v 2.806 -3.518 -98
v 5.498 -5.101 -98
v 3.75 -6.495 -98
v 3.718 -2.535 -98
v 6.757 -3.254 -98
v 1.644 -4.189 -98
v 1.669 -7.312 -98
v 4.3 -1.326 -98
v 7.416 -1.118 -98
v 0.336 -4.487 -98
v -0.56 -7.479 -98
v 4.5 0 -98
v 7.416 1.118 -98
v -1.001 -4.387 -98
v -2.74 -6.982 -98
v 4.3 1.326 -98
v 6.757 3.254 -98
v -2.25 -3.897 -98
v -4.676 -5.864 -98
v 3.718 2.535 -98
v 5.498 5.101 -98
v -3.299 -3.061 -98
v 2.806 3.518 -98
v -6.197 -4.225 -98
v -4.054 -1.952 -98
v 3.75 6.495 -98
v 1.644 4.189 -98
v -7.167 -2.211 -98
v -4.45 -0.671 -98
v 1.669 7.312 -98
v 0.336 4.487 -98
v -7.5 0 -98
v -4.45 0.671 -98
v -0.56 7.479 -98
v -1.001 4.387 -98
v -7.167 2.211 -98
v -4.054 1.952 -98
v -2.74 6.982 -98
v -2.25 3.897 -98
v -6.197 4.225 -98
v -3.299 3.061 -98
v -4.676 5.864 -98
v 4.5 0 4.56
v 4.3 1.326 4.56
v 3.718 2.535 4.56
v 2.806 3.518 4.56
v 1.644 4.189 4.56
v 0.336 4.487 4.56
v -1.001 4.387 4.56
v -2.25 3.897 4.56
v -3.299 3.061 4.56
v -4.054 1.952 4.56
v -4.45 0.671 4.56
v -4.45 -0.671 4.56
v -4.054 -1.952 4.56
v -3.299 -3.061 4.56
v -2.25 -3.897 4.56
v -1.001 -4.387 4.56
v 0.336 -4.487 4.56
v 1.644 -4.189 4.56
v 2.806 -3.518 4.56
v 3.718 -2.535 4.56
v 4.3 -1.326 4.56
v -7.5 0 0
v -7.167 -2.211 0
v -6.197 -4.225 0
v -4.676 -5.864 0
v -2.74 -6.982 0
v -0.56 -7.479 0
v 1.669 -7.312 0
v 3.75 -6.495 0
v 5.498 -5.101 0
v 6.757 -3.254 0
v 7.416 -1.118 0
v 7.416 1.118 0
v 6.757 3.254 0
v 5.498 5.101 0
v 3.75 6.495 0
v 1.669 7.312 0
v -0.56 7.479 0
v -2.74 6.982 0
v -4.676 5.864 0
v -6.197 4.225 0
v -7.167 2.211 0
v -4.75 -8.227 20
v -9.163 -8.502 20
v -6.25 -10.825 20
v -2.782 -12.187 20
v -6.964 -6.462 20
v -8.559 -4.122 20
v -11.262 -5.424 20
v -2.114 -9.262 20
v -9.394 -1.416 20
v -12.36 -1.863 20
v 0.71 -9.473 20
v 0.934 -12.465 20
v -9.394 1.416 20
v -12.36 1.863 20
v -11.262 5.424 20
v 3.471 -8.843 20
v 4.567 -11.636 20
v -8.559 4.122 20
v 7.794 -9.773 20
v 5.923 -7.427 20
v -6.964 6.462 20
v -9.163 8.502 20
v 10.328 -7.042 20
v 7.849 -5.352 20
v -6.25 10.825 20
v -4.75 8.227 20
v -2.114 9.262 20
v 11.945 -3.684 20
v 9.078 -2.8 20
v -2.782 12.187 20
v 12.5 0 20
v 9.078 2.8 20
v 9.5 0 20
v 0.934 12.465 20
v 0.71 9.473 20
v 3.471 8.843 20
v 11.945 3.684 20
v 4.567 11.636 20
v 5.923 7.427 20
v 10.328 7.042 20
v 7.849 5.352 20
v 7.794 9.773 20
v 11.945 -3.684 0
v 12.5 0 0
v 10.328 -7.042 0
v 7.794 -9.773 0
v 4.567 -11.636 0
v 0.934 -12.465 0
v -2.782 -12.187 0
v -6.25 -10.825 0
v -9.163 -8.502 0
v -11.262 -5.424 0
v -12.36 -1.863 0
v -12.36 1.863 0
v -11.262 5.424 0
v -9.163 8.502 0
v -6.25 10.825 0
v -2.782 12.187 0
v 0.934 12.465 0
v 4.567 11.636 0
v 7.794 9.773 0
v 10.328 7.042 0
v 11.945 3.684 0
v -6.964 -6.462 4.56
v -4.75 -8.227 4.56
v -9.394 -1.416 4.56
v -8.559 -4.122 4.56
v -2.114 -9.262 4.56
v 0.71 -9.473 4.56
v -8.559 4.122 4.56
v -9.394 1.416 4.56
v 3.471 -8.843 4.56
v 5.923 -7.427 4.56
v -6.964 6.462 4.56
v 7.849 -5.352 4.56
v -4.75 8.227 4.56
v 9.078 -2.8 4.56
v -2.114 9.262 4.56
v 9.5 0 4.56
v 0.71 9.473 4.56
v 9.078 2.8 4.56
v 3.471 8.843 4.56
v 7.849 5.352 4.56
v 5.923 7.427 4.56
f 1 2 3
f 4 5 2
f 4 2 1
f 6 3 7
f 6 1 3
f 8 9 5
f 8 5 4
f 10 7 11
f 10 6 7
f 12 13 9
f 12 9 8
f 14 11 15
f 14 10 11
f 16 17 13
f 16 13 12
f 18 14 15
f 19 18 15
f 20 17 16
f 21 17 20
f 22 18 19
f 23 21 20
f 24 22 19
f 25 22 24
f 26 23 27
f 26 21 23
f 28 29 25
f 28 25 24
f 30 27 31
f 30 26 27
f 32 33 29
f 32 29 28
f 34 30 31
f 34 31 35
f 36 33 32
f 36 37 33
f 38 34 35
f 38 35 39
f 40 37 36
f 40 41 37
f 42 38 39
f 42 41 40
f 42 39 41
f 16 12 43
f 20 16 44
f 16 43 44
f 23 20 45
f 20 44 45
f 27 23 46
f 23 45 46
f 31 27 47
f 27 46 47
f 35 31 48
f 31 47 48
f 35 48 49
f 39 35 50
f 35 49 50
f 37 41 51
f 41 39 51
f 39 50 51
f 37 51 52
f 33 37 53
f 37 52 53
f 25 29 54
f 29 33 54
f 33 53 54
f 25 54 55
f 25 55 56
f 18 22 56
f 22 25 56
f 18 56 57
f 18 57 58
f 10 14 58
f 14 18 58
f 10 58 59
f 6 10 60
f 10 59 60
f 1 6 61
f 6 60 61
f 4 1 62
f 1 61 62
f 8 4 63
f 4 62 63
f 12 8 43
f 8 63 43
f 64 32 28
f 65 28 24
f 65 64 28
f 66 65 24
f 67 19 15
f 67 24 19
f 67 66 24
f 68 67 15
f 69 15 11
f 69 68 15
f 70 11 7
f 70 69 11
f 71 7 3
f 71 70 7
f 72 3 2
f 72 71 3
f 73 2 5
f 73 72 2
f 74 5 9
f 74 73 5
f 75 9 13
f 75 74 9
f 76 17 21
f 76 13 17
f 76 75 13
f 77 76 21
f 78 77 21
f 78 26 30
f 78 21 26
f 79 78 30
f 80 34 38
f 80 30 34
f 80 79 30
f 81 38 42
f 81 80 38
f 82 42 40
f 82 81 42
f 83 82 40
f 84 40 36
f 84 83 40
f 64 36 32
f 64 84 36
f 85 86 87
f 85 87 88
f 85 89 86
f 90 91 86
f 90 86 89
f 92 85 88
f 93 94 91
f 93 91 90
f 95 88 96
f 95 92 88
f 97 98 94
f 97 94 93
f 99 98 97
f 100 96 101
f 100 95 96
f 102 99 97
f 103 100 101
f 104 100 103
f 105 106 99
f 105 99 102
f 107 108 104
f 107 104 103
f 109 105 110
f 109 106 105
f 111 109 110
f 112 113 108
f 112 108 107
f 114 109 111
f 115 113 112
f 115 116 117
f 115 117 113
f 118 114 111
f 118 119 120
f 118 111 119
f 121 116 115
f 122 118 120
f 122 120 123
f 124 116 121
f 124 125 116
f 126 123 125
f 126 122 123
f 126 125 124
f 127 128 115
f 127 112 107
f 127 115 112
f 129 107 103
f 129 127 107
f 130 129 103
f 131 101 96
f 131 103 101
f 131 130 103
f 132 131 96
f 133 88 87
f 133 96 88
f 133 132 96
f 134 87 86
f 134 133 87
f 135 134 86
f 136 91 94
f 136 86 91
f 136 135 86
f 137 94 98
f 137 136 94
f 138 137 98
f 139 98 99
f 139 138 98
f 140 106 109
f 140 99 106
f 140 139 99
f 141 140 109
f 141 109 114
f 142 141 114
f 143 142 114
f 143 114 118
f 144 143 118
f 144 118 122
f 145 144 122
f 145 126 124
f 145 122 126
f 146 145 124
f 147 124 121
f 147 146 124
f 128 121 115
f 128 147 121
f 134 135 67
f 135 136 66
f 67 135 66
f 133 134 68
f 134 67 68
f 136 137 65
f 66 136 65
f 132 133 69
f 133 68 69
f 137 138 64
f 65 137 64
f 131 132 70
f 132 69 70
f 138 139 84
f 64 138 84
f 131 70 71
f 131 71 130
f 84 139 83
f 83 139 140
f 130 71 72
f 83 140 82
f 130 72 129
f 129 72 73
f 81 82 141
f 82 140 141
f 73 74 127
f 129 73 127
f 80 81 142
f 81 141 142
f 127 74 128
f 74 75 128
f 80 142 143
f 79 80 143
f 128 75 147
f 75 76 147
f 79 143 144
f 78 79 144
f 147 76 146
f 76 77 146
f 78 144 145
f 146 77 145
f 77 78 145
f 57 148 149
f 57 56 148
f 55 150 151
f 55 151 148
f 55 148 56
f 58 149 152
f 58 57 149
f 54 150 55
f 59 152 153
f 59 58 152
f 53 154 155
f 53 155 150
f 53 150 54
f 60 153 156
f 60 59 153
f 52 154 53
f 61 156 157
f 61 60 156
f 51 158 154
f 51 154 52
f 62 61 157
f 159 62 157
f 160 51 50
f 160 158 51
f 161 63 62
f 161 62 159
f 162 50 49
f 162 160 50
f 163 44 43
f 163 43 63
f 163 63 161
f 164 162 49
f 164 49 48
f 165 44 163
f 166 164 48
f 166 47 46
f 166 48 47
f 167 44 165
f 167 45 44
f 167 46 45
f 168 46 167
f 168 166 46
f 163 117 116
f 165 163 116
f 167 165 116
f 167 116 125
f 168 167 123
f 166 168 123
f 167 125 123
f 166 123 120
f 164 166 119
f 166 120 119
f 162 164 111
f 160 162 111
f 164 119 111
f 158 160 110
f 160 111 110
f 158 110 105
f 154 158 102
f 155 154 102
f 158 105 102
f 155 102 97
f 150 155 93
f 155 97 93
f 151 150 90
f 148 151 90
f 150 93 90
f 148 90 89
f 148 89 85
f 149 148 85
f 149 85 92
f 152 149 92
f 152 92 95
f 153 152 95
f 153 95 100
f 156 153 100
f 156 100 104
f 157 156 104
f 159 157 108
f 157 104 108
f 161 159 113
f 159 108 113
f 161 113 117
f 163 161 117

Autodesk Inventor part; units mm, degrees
ref_plane "YZ Plane" through (0, 0, 0) normal (1, 0, 0) x (0, 1, 0)
ref_plane "XZ Plane" through (0, 0, 0) normal (0, 1, 0) x (-1, 0, 0)
ref_plane "XY Plane" through (0, 0, 0) normal (0, 0, 1) x (1, 0, 0)
sketch "Sketch1" plane through (0, 0, 0) normal (0, 0, 1) x (1, 0, 0)
  circle A0 centre (0, 0) radius 12.5
  dimension "d0" = 25
extrude "Extrusion1" add sketch "Sketch1" along normal blind 20
sketch "Sketch2" plane through (0, 0, 0) normal (0, 0, -1) x (-1, 0, 0)
  circle A0 centre (0, 0) radius 4.5
  circle A1 centre (0, 0) radius 7.5
  dimension "d3" = 9
  dimension "d4" = 3
extrude "Extrusion2" add sketch "Sketch2" along normal blind 98
sketch "Sketch3" plane through (0, 0, 20) normal (0, 0, 1) x (1, 0, 0)
  circle A0 centre (0, 0) radius 4.5
  dimension "d7" = 9
extrude "Extrusion3" cut sketch "Sketch3" against normal through all
sketch "Sketch4" plane through (0, 0, 20) normal (0, 0, 1) x (1, 0, 0)
  circle A0 centre (0, 0) radius 9.5
  dimension "d10" = 19
extrude "Extrusion4" cut sketch "Sketch4" against normal blind 15.44
properties part number "Adapter" material "Stainless Steel"
